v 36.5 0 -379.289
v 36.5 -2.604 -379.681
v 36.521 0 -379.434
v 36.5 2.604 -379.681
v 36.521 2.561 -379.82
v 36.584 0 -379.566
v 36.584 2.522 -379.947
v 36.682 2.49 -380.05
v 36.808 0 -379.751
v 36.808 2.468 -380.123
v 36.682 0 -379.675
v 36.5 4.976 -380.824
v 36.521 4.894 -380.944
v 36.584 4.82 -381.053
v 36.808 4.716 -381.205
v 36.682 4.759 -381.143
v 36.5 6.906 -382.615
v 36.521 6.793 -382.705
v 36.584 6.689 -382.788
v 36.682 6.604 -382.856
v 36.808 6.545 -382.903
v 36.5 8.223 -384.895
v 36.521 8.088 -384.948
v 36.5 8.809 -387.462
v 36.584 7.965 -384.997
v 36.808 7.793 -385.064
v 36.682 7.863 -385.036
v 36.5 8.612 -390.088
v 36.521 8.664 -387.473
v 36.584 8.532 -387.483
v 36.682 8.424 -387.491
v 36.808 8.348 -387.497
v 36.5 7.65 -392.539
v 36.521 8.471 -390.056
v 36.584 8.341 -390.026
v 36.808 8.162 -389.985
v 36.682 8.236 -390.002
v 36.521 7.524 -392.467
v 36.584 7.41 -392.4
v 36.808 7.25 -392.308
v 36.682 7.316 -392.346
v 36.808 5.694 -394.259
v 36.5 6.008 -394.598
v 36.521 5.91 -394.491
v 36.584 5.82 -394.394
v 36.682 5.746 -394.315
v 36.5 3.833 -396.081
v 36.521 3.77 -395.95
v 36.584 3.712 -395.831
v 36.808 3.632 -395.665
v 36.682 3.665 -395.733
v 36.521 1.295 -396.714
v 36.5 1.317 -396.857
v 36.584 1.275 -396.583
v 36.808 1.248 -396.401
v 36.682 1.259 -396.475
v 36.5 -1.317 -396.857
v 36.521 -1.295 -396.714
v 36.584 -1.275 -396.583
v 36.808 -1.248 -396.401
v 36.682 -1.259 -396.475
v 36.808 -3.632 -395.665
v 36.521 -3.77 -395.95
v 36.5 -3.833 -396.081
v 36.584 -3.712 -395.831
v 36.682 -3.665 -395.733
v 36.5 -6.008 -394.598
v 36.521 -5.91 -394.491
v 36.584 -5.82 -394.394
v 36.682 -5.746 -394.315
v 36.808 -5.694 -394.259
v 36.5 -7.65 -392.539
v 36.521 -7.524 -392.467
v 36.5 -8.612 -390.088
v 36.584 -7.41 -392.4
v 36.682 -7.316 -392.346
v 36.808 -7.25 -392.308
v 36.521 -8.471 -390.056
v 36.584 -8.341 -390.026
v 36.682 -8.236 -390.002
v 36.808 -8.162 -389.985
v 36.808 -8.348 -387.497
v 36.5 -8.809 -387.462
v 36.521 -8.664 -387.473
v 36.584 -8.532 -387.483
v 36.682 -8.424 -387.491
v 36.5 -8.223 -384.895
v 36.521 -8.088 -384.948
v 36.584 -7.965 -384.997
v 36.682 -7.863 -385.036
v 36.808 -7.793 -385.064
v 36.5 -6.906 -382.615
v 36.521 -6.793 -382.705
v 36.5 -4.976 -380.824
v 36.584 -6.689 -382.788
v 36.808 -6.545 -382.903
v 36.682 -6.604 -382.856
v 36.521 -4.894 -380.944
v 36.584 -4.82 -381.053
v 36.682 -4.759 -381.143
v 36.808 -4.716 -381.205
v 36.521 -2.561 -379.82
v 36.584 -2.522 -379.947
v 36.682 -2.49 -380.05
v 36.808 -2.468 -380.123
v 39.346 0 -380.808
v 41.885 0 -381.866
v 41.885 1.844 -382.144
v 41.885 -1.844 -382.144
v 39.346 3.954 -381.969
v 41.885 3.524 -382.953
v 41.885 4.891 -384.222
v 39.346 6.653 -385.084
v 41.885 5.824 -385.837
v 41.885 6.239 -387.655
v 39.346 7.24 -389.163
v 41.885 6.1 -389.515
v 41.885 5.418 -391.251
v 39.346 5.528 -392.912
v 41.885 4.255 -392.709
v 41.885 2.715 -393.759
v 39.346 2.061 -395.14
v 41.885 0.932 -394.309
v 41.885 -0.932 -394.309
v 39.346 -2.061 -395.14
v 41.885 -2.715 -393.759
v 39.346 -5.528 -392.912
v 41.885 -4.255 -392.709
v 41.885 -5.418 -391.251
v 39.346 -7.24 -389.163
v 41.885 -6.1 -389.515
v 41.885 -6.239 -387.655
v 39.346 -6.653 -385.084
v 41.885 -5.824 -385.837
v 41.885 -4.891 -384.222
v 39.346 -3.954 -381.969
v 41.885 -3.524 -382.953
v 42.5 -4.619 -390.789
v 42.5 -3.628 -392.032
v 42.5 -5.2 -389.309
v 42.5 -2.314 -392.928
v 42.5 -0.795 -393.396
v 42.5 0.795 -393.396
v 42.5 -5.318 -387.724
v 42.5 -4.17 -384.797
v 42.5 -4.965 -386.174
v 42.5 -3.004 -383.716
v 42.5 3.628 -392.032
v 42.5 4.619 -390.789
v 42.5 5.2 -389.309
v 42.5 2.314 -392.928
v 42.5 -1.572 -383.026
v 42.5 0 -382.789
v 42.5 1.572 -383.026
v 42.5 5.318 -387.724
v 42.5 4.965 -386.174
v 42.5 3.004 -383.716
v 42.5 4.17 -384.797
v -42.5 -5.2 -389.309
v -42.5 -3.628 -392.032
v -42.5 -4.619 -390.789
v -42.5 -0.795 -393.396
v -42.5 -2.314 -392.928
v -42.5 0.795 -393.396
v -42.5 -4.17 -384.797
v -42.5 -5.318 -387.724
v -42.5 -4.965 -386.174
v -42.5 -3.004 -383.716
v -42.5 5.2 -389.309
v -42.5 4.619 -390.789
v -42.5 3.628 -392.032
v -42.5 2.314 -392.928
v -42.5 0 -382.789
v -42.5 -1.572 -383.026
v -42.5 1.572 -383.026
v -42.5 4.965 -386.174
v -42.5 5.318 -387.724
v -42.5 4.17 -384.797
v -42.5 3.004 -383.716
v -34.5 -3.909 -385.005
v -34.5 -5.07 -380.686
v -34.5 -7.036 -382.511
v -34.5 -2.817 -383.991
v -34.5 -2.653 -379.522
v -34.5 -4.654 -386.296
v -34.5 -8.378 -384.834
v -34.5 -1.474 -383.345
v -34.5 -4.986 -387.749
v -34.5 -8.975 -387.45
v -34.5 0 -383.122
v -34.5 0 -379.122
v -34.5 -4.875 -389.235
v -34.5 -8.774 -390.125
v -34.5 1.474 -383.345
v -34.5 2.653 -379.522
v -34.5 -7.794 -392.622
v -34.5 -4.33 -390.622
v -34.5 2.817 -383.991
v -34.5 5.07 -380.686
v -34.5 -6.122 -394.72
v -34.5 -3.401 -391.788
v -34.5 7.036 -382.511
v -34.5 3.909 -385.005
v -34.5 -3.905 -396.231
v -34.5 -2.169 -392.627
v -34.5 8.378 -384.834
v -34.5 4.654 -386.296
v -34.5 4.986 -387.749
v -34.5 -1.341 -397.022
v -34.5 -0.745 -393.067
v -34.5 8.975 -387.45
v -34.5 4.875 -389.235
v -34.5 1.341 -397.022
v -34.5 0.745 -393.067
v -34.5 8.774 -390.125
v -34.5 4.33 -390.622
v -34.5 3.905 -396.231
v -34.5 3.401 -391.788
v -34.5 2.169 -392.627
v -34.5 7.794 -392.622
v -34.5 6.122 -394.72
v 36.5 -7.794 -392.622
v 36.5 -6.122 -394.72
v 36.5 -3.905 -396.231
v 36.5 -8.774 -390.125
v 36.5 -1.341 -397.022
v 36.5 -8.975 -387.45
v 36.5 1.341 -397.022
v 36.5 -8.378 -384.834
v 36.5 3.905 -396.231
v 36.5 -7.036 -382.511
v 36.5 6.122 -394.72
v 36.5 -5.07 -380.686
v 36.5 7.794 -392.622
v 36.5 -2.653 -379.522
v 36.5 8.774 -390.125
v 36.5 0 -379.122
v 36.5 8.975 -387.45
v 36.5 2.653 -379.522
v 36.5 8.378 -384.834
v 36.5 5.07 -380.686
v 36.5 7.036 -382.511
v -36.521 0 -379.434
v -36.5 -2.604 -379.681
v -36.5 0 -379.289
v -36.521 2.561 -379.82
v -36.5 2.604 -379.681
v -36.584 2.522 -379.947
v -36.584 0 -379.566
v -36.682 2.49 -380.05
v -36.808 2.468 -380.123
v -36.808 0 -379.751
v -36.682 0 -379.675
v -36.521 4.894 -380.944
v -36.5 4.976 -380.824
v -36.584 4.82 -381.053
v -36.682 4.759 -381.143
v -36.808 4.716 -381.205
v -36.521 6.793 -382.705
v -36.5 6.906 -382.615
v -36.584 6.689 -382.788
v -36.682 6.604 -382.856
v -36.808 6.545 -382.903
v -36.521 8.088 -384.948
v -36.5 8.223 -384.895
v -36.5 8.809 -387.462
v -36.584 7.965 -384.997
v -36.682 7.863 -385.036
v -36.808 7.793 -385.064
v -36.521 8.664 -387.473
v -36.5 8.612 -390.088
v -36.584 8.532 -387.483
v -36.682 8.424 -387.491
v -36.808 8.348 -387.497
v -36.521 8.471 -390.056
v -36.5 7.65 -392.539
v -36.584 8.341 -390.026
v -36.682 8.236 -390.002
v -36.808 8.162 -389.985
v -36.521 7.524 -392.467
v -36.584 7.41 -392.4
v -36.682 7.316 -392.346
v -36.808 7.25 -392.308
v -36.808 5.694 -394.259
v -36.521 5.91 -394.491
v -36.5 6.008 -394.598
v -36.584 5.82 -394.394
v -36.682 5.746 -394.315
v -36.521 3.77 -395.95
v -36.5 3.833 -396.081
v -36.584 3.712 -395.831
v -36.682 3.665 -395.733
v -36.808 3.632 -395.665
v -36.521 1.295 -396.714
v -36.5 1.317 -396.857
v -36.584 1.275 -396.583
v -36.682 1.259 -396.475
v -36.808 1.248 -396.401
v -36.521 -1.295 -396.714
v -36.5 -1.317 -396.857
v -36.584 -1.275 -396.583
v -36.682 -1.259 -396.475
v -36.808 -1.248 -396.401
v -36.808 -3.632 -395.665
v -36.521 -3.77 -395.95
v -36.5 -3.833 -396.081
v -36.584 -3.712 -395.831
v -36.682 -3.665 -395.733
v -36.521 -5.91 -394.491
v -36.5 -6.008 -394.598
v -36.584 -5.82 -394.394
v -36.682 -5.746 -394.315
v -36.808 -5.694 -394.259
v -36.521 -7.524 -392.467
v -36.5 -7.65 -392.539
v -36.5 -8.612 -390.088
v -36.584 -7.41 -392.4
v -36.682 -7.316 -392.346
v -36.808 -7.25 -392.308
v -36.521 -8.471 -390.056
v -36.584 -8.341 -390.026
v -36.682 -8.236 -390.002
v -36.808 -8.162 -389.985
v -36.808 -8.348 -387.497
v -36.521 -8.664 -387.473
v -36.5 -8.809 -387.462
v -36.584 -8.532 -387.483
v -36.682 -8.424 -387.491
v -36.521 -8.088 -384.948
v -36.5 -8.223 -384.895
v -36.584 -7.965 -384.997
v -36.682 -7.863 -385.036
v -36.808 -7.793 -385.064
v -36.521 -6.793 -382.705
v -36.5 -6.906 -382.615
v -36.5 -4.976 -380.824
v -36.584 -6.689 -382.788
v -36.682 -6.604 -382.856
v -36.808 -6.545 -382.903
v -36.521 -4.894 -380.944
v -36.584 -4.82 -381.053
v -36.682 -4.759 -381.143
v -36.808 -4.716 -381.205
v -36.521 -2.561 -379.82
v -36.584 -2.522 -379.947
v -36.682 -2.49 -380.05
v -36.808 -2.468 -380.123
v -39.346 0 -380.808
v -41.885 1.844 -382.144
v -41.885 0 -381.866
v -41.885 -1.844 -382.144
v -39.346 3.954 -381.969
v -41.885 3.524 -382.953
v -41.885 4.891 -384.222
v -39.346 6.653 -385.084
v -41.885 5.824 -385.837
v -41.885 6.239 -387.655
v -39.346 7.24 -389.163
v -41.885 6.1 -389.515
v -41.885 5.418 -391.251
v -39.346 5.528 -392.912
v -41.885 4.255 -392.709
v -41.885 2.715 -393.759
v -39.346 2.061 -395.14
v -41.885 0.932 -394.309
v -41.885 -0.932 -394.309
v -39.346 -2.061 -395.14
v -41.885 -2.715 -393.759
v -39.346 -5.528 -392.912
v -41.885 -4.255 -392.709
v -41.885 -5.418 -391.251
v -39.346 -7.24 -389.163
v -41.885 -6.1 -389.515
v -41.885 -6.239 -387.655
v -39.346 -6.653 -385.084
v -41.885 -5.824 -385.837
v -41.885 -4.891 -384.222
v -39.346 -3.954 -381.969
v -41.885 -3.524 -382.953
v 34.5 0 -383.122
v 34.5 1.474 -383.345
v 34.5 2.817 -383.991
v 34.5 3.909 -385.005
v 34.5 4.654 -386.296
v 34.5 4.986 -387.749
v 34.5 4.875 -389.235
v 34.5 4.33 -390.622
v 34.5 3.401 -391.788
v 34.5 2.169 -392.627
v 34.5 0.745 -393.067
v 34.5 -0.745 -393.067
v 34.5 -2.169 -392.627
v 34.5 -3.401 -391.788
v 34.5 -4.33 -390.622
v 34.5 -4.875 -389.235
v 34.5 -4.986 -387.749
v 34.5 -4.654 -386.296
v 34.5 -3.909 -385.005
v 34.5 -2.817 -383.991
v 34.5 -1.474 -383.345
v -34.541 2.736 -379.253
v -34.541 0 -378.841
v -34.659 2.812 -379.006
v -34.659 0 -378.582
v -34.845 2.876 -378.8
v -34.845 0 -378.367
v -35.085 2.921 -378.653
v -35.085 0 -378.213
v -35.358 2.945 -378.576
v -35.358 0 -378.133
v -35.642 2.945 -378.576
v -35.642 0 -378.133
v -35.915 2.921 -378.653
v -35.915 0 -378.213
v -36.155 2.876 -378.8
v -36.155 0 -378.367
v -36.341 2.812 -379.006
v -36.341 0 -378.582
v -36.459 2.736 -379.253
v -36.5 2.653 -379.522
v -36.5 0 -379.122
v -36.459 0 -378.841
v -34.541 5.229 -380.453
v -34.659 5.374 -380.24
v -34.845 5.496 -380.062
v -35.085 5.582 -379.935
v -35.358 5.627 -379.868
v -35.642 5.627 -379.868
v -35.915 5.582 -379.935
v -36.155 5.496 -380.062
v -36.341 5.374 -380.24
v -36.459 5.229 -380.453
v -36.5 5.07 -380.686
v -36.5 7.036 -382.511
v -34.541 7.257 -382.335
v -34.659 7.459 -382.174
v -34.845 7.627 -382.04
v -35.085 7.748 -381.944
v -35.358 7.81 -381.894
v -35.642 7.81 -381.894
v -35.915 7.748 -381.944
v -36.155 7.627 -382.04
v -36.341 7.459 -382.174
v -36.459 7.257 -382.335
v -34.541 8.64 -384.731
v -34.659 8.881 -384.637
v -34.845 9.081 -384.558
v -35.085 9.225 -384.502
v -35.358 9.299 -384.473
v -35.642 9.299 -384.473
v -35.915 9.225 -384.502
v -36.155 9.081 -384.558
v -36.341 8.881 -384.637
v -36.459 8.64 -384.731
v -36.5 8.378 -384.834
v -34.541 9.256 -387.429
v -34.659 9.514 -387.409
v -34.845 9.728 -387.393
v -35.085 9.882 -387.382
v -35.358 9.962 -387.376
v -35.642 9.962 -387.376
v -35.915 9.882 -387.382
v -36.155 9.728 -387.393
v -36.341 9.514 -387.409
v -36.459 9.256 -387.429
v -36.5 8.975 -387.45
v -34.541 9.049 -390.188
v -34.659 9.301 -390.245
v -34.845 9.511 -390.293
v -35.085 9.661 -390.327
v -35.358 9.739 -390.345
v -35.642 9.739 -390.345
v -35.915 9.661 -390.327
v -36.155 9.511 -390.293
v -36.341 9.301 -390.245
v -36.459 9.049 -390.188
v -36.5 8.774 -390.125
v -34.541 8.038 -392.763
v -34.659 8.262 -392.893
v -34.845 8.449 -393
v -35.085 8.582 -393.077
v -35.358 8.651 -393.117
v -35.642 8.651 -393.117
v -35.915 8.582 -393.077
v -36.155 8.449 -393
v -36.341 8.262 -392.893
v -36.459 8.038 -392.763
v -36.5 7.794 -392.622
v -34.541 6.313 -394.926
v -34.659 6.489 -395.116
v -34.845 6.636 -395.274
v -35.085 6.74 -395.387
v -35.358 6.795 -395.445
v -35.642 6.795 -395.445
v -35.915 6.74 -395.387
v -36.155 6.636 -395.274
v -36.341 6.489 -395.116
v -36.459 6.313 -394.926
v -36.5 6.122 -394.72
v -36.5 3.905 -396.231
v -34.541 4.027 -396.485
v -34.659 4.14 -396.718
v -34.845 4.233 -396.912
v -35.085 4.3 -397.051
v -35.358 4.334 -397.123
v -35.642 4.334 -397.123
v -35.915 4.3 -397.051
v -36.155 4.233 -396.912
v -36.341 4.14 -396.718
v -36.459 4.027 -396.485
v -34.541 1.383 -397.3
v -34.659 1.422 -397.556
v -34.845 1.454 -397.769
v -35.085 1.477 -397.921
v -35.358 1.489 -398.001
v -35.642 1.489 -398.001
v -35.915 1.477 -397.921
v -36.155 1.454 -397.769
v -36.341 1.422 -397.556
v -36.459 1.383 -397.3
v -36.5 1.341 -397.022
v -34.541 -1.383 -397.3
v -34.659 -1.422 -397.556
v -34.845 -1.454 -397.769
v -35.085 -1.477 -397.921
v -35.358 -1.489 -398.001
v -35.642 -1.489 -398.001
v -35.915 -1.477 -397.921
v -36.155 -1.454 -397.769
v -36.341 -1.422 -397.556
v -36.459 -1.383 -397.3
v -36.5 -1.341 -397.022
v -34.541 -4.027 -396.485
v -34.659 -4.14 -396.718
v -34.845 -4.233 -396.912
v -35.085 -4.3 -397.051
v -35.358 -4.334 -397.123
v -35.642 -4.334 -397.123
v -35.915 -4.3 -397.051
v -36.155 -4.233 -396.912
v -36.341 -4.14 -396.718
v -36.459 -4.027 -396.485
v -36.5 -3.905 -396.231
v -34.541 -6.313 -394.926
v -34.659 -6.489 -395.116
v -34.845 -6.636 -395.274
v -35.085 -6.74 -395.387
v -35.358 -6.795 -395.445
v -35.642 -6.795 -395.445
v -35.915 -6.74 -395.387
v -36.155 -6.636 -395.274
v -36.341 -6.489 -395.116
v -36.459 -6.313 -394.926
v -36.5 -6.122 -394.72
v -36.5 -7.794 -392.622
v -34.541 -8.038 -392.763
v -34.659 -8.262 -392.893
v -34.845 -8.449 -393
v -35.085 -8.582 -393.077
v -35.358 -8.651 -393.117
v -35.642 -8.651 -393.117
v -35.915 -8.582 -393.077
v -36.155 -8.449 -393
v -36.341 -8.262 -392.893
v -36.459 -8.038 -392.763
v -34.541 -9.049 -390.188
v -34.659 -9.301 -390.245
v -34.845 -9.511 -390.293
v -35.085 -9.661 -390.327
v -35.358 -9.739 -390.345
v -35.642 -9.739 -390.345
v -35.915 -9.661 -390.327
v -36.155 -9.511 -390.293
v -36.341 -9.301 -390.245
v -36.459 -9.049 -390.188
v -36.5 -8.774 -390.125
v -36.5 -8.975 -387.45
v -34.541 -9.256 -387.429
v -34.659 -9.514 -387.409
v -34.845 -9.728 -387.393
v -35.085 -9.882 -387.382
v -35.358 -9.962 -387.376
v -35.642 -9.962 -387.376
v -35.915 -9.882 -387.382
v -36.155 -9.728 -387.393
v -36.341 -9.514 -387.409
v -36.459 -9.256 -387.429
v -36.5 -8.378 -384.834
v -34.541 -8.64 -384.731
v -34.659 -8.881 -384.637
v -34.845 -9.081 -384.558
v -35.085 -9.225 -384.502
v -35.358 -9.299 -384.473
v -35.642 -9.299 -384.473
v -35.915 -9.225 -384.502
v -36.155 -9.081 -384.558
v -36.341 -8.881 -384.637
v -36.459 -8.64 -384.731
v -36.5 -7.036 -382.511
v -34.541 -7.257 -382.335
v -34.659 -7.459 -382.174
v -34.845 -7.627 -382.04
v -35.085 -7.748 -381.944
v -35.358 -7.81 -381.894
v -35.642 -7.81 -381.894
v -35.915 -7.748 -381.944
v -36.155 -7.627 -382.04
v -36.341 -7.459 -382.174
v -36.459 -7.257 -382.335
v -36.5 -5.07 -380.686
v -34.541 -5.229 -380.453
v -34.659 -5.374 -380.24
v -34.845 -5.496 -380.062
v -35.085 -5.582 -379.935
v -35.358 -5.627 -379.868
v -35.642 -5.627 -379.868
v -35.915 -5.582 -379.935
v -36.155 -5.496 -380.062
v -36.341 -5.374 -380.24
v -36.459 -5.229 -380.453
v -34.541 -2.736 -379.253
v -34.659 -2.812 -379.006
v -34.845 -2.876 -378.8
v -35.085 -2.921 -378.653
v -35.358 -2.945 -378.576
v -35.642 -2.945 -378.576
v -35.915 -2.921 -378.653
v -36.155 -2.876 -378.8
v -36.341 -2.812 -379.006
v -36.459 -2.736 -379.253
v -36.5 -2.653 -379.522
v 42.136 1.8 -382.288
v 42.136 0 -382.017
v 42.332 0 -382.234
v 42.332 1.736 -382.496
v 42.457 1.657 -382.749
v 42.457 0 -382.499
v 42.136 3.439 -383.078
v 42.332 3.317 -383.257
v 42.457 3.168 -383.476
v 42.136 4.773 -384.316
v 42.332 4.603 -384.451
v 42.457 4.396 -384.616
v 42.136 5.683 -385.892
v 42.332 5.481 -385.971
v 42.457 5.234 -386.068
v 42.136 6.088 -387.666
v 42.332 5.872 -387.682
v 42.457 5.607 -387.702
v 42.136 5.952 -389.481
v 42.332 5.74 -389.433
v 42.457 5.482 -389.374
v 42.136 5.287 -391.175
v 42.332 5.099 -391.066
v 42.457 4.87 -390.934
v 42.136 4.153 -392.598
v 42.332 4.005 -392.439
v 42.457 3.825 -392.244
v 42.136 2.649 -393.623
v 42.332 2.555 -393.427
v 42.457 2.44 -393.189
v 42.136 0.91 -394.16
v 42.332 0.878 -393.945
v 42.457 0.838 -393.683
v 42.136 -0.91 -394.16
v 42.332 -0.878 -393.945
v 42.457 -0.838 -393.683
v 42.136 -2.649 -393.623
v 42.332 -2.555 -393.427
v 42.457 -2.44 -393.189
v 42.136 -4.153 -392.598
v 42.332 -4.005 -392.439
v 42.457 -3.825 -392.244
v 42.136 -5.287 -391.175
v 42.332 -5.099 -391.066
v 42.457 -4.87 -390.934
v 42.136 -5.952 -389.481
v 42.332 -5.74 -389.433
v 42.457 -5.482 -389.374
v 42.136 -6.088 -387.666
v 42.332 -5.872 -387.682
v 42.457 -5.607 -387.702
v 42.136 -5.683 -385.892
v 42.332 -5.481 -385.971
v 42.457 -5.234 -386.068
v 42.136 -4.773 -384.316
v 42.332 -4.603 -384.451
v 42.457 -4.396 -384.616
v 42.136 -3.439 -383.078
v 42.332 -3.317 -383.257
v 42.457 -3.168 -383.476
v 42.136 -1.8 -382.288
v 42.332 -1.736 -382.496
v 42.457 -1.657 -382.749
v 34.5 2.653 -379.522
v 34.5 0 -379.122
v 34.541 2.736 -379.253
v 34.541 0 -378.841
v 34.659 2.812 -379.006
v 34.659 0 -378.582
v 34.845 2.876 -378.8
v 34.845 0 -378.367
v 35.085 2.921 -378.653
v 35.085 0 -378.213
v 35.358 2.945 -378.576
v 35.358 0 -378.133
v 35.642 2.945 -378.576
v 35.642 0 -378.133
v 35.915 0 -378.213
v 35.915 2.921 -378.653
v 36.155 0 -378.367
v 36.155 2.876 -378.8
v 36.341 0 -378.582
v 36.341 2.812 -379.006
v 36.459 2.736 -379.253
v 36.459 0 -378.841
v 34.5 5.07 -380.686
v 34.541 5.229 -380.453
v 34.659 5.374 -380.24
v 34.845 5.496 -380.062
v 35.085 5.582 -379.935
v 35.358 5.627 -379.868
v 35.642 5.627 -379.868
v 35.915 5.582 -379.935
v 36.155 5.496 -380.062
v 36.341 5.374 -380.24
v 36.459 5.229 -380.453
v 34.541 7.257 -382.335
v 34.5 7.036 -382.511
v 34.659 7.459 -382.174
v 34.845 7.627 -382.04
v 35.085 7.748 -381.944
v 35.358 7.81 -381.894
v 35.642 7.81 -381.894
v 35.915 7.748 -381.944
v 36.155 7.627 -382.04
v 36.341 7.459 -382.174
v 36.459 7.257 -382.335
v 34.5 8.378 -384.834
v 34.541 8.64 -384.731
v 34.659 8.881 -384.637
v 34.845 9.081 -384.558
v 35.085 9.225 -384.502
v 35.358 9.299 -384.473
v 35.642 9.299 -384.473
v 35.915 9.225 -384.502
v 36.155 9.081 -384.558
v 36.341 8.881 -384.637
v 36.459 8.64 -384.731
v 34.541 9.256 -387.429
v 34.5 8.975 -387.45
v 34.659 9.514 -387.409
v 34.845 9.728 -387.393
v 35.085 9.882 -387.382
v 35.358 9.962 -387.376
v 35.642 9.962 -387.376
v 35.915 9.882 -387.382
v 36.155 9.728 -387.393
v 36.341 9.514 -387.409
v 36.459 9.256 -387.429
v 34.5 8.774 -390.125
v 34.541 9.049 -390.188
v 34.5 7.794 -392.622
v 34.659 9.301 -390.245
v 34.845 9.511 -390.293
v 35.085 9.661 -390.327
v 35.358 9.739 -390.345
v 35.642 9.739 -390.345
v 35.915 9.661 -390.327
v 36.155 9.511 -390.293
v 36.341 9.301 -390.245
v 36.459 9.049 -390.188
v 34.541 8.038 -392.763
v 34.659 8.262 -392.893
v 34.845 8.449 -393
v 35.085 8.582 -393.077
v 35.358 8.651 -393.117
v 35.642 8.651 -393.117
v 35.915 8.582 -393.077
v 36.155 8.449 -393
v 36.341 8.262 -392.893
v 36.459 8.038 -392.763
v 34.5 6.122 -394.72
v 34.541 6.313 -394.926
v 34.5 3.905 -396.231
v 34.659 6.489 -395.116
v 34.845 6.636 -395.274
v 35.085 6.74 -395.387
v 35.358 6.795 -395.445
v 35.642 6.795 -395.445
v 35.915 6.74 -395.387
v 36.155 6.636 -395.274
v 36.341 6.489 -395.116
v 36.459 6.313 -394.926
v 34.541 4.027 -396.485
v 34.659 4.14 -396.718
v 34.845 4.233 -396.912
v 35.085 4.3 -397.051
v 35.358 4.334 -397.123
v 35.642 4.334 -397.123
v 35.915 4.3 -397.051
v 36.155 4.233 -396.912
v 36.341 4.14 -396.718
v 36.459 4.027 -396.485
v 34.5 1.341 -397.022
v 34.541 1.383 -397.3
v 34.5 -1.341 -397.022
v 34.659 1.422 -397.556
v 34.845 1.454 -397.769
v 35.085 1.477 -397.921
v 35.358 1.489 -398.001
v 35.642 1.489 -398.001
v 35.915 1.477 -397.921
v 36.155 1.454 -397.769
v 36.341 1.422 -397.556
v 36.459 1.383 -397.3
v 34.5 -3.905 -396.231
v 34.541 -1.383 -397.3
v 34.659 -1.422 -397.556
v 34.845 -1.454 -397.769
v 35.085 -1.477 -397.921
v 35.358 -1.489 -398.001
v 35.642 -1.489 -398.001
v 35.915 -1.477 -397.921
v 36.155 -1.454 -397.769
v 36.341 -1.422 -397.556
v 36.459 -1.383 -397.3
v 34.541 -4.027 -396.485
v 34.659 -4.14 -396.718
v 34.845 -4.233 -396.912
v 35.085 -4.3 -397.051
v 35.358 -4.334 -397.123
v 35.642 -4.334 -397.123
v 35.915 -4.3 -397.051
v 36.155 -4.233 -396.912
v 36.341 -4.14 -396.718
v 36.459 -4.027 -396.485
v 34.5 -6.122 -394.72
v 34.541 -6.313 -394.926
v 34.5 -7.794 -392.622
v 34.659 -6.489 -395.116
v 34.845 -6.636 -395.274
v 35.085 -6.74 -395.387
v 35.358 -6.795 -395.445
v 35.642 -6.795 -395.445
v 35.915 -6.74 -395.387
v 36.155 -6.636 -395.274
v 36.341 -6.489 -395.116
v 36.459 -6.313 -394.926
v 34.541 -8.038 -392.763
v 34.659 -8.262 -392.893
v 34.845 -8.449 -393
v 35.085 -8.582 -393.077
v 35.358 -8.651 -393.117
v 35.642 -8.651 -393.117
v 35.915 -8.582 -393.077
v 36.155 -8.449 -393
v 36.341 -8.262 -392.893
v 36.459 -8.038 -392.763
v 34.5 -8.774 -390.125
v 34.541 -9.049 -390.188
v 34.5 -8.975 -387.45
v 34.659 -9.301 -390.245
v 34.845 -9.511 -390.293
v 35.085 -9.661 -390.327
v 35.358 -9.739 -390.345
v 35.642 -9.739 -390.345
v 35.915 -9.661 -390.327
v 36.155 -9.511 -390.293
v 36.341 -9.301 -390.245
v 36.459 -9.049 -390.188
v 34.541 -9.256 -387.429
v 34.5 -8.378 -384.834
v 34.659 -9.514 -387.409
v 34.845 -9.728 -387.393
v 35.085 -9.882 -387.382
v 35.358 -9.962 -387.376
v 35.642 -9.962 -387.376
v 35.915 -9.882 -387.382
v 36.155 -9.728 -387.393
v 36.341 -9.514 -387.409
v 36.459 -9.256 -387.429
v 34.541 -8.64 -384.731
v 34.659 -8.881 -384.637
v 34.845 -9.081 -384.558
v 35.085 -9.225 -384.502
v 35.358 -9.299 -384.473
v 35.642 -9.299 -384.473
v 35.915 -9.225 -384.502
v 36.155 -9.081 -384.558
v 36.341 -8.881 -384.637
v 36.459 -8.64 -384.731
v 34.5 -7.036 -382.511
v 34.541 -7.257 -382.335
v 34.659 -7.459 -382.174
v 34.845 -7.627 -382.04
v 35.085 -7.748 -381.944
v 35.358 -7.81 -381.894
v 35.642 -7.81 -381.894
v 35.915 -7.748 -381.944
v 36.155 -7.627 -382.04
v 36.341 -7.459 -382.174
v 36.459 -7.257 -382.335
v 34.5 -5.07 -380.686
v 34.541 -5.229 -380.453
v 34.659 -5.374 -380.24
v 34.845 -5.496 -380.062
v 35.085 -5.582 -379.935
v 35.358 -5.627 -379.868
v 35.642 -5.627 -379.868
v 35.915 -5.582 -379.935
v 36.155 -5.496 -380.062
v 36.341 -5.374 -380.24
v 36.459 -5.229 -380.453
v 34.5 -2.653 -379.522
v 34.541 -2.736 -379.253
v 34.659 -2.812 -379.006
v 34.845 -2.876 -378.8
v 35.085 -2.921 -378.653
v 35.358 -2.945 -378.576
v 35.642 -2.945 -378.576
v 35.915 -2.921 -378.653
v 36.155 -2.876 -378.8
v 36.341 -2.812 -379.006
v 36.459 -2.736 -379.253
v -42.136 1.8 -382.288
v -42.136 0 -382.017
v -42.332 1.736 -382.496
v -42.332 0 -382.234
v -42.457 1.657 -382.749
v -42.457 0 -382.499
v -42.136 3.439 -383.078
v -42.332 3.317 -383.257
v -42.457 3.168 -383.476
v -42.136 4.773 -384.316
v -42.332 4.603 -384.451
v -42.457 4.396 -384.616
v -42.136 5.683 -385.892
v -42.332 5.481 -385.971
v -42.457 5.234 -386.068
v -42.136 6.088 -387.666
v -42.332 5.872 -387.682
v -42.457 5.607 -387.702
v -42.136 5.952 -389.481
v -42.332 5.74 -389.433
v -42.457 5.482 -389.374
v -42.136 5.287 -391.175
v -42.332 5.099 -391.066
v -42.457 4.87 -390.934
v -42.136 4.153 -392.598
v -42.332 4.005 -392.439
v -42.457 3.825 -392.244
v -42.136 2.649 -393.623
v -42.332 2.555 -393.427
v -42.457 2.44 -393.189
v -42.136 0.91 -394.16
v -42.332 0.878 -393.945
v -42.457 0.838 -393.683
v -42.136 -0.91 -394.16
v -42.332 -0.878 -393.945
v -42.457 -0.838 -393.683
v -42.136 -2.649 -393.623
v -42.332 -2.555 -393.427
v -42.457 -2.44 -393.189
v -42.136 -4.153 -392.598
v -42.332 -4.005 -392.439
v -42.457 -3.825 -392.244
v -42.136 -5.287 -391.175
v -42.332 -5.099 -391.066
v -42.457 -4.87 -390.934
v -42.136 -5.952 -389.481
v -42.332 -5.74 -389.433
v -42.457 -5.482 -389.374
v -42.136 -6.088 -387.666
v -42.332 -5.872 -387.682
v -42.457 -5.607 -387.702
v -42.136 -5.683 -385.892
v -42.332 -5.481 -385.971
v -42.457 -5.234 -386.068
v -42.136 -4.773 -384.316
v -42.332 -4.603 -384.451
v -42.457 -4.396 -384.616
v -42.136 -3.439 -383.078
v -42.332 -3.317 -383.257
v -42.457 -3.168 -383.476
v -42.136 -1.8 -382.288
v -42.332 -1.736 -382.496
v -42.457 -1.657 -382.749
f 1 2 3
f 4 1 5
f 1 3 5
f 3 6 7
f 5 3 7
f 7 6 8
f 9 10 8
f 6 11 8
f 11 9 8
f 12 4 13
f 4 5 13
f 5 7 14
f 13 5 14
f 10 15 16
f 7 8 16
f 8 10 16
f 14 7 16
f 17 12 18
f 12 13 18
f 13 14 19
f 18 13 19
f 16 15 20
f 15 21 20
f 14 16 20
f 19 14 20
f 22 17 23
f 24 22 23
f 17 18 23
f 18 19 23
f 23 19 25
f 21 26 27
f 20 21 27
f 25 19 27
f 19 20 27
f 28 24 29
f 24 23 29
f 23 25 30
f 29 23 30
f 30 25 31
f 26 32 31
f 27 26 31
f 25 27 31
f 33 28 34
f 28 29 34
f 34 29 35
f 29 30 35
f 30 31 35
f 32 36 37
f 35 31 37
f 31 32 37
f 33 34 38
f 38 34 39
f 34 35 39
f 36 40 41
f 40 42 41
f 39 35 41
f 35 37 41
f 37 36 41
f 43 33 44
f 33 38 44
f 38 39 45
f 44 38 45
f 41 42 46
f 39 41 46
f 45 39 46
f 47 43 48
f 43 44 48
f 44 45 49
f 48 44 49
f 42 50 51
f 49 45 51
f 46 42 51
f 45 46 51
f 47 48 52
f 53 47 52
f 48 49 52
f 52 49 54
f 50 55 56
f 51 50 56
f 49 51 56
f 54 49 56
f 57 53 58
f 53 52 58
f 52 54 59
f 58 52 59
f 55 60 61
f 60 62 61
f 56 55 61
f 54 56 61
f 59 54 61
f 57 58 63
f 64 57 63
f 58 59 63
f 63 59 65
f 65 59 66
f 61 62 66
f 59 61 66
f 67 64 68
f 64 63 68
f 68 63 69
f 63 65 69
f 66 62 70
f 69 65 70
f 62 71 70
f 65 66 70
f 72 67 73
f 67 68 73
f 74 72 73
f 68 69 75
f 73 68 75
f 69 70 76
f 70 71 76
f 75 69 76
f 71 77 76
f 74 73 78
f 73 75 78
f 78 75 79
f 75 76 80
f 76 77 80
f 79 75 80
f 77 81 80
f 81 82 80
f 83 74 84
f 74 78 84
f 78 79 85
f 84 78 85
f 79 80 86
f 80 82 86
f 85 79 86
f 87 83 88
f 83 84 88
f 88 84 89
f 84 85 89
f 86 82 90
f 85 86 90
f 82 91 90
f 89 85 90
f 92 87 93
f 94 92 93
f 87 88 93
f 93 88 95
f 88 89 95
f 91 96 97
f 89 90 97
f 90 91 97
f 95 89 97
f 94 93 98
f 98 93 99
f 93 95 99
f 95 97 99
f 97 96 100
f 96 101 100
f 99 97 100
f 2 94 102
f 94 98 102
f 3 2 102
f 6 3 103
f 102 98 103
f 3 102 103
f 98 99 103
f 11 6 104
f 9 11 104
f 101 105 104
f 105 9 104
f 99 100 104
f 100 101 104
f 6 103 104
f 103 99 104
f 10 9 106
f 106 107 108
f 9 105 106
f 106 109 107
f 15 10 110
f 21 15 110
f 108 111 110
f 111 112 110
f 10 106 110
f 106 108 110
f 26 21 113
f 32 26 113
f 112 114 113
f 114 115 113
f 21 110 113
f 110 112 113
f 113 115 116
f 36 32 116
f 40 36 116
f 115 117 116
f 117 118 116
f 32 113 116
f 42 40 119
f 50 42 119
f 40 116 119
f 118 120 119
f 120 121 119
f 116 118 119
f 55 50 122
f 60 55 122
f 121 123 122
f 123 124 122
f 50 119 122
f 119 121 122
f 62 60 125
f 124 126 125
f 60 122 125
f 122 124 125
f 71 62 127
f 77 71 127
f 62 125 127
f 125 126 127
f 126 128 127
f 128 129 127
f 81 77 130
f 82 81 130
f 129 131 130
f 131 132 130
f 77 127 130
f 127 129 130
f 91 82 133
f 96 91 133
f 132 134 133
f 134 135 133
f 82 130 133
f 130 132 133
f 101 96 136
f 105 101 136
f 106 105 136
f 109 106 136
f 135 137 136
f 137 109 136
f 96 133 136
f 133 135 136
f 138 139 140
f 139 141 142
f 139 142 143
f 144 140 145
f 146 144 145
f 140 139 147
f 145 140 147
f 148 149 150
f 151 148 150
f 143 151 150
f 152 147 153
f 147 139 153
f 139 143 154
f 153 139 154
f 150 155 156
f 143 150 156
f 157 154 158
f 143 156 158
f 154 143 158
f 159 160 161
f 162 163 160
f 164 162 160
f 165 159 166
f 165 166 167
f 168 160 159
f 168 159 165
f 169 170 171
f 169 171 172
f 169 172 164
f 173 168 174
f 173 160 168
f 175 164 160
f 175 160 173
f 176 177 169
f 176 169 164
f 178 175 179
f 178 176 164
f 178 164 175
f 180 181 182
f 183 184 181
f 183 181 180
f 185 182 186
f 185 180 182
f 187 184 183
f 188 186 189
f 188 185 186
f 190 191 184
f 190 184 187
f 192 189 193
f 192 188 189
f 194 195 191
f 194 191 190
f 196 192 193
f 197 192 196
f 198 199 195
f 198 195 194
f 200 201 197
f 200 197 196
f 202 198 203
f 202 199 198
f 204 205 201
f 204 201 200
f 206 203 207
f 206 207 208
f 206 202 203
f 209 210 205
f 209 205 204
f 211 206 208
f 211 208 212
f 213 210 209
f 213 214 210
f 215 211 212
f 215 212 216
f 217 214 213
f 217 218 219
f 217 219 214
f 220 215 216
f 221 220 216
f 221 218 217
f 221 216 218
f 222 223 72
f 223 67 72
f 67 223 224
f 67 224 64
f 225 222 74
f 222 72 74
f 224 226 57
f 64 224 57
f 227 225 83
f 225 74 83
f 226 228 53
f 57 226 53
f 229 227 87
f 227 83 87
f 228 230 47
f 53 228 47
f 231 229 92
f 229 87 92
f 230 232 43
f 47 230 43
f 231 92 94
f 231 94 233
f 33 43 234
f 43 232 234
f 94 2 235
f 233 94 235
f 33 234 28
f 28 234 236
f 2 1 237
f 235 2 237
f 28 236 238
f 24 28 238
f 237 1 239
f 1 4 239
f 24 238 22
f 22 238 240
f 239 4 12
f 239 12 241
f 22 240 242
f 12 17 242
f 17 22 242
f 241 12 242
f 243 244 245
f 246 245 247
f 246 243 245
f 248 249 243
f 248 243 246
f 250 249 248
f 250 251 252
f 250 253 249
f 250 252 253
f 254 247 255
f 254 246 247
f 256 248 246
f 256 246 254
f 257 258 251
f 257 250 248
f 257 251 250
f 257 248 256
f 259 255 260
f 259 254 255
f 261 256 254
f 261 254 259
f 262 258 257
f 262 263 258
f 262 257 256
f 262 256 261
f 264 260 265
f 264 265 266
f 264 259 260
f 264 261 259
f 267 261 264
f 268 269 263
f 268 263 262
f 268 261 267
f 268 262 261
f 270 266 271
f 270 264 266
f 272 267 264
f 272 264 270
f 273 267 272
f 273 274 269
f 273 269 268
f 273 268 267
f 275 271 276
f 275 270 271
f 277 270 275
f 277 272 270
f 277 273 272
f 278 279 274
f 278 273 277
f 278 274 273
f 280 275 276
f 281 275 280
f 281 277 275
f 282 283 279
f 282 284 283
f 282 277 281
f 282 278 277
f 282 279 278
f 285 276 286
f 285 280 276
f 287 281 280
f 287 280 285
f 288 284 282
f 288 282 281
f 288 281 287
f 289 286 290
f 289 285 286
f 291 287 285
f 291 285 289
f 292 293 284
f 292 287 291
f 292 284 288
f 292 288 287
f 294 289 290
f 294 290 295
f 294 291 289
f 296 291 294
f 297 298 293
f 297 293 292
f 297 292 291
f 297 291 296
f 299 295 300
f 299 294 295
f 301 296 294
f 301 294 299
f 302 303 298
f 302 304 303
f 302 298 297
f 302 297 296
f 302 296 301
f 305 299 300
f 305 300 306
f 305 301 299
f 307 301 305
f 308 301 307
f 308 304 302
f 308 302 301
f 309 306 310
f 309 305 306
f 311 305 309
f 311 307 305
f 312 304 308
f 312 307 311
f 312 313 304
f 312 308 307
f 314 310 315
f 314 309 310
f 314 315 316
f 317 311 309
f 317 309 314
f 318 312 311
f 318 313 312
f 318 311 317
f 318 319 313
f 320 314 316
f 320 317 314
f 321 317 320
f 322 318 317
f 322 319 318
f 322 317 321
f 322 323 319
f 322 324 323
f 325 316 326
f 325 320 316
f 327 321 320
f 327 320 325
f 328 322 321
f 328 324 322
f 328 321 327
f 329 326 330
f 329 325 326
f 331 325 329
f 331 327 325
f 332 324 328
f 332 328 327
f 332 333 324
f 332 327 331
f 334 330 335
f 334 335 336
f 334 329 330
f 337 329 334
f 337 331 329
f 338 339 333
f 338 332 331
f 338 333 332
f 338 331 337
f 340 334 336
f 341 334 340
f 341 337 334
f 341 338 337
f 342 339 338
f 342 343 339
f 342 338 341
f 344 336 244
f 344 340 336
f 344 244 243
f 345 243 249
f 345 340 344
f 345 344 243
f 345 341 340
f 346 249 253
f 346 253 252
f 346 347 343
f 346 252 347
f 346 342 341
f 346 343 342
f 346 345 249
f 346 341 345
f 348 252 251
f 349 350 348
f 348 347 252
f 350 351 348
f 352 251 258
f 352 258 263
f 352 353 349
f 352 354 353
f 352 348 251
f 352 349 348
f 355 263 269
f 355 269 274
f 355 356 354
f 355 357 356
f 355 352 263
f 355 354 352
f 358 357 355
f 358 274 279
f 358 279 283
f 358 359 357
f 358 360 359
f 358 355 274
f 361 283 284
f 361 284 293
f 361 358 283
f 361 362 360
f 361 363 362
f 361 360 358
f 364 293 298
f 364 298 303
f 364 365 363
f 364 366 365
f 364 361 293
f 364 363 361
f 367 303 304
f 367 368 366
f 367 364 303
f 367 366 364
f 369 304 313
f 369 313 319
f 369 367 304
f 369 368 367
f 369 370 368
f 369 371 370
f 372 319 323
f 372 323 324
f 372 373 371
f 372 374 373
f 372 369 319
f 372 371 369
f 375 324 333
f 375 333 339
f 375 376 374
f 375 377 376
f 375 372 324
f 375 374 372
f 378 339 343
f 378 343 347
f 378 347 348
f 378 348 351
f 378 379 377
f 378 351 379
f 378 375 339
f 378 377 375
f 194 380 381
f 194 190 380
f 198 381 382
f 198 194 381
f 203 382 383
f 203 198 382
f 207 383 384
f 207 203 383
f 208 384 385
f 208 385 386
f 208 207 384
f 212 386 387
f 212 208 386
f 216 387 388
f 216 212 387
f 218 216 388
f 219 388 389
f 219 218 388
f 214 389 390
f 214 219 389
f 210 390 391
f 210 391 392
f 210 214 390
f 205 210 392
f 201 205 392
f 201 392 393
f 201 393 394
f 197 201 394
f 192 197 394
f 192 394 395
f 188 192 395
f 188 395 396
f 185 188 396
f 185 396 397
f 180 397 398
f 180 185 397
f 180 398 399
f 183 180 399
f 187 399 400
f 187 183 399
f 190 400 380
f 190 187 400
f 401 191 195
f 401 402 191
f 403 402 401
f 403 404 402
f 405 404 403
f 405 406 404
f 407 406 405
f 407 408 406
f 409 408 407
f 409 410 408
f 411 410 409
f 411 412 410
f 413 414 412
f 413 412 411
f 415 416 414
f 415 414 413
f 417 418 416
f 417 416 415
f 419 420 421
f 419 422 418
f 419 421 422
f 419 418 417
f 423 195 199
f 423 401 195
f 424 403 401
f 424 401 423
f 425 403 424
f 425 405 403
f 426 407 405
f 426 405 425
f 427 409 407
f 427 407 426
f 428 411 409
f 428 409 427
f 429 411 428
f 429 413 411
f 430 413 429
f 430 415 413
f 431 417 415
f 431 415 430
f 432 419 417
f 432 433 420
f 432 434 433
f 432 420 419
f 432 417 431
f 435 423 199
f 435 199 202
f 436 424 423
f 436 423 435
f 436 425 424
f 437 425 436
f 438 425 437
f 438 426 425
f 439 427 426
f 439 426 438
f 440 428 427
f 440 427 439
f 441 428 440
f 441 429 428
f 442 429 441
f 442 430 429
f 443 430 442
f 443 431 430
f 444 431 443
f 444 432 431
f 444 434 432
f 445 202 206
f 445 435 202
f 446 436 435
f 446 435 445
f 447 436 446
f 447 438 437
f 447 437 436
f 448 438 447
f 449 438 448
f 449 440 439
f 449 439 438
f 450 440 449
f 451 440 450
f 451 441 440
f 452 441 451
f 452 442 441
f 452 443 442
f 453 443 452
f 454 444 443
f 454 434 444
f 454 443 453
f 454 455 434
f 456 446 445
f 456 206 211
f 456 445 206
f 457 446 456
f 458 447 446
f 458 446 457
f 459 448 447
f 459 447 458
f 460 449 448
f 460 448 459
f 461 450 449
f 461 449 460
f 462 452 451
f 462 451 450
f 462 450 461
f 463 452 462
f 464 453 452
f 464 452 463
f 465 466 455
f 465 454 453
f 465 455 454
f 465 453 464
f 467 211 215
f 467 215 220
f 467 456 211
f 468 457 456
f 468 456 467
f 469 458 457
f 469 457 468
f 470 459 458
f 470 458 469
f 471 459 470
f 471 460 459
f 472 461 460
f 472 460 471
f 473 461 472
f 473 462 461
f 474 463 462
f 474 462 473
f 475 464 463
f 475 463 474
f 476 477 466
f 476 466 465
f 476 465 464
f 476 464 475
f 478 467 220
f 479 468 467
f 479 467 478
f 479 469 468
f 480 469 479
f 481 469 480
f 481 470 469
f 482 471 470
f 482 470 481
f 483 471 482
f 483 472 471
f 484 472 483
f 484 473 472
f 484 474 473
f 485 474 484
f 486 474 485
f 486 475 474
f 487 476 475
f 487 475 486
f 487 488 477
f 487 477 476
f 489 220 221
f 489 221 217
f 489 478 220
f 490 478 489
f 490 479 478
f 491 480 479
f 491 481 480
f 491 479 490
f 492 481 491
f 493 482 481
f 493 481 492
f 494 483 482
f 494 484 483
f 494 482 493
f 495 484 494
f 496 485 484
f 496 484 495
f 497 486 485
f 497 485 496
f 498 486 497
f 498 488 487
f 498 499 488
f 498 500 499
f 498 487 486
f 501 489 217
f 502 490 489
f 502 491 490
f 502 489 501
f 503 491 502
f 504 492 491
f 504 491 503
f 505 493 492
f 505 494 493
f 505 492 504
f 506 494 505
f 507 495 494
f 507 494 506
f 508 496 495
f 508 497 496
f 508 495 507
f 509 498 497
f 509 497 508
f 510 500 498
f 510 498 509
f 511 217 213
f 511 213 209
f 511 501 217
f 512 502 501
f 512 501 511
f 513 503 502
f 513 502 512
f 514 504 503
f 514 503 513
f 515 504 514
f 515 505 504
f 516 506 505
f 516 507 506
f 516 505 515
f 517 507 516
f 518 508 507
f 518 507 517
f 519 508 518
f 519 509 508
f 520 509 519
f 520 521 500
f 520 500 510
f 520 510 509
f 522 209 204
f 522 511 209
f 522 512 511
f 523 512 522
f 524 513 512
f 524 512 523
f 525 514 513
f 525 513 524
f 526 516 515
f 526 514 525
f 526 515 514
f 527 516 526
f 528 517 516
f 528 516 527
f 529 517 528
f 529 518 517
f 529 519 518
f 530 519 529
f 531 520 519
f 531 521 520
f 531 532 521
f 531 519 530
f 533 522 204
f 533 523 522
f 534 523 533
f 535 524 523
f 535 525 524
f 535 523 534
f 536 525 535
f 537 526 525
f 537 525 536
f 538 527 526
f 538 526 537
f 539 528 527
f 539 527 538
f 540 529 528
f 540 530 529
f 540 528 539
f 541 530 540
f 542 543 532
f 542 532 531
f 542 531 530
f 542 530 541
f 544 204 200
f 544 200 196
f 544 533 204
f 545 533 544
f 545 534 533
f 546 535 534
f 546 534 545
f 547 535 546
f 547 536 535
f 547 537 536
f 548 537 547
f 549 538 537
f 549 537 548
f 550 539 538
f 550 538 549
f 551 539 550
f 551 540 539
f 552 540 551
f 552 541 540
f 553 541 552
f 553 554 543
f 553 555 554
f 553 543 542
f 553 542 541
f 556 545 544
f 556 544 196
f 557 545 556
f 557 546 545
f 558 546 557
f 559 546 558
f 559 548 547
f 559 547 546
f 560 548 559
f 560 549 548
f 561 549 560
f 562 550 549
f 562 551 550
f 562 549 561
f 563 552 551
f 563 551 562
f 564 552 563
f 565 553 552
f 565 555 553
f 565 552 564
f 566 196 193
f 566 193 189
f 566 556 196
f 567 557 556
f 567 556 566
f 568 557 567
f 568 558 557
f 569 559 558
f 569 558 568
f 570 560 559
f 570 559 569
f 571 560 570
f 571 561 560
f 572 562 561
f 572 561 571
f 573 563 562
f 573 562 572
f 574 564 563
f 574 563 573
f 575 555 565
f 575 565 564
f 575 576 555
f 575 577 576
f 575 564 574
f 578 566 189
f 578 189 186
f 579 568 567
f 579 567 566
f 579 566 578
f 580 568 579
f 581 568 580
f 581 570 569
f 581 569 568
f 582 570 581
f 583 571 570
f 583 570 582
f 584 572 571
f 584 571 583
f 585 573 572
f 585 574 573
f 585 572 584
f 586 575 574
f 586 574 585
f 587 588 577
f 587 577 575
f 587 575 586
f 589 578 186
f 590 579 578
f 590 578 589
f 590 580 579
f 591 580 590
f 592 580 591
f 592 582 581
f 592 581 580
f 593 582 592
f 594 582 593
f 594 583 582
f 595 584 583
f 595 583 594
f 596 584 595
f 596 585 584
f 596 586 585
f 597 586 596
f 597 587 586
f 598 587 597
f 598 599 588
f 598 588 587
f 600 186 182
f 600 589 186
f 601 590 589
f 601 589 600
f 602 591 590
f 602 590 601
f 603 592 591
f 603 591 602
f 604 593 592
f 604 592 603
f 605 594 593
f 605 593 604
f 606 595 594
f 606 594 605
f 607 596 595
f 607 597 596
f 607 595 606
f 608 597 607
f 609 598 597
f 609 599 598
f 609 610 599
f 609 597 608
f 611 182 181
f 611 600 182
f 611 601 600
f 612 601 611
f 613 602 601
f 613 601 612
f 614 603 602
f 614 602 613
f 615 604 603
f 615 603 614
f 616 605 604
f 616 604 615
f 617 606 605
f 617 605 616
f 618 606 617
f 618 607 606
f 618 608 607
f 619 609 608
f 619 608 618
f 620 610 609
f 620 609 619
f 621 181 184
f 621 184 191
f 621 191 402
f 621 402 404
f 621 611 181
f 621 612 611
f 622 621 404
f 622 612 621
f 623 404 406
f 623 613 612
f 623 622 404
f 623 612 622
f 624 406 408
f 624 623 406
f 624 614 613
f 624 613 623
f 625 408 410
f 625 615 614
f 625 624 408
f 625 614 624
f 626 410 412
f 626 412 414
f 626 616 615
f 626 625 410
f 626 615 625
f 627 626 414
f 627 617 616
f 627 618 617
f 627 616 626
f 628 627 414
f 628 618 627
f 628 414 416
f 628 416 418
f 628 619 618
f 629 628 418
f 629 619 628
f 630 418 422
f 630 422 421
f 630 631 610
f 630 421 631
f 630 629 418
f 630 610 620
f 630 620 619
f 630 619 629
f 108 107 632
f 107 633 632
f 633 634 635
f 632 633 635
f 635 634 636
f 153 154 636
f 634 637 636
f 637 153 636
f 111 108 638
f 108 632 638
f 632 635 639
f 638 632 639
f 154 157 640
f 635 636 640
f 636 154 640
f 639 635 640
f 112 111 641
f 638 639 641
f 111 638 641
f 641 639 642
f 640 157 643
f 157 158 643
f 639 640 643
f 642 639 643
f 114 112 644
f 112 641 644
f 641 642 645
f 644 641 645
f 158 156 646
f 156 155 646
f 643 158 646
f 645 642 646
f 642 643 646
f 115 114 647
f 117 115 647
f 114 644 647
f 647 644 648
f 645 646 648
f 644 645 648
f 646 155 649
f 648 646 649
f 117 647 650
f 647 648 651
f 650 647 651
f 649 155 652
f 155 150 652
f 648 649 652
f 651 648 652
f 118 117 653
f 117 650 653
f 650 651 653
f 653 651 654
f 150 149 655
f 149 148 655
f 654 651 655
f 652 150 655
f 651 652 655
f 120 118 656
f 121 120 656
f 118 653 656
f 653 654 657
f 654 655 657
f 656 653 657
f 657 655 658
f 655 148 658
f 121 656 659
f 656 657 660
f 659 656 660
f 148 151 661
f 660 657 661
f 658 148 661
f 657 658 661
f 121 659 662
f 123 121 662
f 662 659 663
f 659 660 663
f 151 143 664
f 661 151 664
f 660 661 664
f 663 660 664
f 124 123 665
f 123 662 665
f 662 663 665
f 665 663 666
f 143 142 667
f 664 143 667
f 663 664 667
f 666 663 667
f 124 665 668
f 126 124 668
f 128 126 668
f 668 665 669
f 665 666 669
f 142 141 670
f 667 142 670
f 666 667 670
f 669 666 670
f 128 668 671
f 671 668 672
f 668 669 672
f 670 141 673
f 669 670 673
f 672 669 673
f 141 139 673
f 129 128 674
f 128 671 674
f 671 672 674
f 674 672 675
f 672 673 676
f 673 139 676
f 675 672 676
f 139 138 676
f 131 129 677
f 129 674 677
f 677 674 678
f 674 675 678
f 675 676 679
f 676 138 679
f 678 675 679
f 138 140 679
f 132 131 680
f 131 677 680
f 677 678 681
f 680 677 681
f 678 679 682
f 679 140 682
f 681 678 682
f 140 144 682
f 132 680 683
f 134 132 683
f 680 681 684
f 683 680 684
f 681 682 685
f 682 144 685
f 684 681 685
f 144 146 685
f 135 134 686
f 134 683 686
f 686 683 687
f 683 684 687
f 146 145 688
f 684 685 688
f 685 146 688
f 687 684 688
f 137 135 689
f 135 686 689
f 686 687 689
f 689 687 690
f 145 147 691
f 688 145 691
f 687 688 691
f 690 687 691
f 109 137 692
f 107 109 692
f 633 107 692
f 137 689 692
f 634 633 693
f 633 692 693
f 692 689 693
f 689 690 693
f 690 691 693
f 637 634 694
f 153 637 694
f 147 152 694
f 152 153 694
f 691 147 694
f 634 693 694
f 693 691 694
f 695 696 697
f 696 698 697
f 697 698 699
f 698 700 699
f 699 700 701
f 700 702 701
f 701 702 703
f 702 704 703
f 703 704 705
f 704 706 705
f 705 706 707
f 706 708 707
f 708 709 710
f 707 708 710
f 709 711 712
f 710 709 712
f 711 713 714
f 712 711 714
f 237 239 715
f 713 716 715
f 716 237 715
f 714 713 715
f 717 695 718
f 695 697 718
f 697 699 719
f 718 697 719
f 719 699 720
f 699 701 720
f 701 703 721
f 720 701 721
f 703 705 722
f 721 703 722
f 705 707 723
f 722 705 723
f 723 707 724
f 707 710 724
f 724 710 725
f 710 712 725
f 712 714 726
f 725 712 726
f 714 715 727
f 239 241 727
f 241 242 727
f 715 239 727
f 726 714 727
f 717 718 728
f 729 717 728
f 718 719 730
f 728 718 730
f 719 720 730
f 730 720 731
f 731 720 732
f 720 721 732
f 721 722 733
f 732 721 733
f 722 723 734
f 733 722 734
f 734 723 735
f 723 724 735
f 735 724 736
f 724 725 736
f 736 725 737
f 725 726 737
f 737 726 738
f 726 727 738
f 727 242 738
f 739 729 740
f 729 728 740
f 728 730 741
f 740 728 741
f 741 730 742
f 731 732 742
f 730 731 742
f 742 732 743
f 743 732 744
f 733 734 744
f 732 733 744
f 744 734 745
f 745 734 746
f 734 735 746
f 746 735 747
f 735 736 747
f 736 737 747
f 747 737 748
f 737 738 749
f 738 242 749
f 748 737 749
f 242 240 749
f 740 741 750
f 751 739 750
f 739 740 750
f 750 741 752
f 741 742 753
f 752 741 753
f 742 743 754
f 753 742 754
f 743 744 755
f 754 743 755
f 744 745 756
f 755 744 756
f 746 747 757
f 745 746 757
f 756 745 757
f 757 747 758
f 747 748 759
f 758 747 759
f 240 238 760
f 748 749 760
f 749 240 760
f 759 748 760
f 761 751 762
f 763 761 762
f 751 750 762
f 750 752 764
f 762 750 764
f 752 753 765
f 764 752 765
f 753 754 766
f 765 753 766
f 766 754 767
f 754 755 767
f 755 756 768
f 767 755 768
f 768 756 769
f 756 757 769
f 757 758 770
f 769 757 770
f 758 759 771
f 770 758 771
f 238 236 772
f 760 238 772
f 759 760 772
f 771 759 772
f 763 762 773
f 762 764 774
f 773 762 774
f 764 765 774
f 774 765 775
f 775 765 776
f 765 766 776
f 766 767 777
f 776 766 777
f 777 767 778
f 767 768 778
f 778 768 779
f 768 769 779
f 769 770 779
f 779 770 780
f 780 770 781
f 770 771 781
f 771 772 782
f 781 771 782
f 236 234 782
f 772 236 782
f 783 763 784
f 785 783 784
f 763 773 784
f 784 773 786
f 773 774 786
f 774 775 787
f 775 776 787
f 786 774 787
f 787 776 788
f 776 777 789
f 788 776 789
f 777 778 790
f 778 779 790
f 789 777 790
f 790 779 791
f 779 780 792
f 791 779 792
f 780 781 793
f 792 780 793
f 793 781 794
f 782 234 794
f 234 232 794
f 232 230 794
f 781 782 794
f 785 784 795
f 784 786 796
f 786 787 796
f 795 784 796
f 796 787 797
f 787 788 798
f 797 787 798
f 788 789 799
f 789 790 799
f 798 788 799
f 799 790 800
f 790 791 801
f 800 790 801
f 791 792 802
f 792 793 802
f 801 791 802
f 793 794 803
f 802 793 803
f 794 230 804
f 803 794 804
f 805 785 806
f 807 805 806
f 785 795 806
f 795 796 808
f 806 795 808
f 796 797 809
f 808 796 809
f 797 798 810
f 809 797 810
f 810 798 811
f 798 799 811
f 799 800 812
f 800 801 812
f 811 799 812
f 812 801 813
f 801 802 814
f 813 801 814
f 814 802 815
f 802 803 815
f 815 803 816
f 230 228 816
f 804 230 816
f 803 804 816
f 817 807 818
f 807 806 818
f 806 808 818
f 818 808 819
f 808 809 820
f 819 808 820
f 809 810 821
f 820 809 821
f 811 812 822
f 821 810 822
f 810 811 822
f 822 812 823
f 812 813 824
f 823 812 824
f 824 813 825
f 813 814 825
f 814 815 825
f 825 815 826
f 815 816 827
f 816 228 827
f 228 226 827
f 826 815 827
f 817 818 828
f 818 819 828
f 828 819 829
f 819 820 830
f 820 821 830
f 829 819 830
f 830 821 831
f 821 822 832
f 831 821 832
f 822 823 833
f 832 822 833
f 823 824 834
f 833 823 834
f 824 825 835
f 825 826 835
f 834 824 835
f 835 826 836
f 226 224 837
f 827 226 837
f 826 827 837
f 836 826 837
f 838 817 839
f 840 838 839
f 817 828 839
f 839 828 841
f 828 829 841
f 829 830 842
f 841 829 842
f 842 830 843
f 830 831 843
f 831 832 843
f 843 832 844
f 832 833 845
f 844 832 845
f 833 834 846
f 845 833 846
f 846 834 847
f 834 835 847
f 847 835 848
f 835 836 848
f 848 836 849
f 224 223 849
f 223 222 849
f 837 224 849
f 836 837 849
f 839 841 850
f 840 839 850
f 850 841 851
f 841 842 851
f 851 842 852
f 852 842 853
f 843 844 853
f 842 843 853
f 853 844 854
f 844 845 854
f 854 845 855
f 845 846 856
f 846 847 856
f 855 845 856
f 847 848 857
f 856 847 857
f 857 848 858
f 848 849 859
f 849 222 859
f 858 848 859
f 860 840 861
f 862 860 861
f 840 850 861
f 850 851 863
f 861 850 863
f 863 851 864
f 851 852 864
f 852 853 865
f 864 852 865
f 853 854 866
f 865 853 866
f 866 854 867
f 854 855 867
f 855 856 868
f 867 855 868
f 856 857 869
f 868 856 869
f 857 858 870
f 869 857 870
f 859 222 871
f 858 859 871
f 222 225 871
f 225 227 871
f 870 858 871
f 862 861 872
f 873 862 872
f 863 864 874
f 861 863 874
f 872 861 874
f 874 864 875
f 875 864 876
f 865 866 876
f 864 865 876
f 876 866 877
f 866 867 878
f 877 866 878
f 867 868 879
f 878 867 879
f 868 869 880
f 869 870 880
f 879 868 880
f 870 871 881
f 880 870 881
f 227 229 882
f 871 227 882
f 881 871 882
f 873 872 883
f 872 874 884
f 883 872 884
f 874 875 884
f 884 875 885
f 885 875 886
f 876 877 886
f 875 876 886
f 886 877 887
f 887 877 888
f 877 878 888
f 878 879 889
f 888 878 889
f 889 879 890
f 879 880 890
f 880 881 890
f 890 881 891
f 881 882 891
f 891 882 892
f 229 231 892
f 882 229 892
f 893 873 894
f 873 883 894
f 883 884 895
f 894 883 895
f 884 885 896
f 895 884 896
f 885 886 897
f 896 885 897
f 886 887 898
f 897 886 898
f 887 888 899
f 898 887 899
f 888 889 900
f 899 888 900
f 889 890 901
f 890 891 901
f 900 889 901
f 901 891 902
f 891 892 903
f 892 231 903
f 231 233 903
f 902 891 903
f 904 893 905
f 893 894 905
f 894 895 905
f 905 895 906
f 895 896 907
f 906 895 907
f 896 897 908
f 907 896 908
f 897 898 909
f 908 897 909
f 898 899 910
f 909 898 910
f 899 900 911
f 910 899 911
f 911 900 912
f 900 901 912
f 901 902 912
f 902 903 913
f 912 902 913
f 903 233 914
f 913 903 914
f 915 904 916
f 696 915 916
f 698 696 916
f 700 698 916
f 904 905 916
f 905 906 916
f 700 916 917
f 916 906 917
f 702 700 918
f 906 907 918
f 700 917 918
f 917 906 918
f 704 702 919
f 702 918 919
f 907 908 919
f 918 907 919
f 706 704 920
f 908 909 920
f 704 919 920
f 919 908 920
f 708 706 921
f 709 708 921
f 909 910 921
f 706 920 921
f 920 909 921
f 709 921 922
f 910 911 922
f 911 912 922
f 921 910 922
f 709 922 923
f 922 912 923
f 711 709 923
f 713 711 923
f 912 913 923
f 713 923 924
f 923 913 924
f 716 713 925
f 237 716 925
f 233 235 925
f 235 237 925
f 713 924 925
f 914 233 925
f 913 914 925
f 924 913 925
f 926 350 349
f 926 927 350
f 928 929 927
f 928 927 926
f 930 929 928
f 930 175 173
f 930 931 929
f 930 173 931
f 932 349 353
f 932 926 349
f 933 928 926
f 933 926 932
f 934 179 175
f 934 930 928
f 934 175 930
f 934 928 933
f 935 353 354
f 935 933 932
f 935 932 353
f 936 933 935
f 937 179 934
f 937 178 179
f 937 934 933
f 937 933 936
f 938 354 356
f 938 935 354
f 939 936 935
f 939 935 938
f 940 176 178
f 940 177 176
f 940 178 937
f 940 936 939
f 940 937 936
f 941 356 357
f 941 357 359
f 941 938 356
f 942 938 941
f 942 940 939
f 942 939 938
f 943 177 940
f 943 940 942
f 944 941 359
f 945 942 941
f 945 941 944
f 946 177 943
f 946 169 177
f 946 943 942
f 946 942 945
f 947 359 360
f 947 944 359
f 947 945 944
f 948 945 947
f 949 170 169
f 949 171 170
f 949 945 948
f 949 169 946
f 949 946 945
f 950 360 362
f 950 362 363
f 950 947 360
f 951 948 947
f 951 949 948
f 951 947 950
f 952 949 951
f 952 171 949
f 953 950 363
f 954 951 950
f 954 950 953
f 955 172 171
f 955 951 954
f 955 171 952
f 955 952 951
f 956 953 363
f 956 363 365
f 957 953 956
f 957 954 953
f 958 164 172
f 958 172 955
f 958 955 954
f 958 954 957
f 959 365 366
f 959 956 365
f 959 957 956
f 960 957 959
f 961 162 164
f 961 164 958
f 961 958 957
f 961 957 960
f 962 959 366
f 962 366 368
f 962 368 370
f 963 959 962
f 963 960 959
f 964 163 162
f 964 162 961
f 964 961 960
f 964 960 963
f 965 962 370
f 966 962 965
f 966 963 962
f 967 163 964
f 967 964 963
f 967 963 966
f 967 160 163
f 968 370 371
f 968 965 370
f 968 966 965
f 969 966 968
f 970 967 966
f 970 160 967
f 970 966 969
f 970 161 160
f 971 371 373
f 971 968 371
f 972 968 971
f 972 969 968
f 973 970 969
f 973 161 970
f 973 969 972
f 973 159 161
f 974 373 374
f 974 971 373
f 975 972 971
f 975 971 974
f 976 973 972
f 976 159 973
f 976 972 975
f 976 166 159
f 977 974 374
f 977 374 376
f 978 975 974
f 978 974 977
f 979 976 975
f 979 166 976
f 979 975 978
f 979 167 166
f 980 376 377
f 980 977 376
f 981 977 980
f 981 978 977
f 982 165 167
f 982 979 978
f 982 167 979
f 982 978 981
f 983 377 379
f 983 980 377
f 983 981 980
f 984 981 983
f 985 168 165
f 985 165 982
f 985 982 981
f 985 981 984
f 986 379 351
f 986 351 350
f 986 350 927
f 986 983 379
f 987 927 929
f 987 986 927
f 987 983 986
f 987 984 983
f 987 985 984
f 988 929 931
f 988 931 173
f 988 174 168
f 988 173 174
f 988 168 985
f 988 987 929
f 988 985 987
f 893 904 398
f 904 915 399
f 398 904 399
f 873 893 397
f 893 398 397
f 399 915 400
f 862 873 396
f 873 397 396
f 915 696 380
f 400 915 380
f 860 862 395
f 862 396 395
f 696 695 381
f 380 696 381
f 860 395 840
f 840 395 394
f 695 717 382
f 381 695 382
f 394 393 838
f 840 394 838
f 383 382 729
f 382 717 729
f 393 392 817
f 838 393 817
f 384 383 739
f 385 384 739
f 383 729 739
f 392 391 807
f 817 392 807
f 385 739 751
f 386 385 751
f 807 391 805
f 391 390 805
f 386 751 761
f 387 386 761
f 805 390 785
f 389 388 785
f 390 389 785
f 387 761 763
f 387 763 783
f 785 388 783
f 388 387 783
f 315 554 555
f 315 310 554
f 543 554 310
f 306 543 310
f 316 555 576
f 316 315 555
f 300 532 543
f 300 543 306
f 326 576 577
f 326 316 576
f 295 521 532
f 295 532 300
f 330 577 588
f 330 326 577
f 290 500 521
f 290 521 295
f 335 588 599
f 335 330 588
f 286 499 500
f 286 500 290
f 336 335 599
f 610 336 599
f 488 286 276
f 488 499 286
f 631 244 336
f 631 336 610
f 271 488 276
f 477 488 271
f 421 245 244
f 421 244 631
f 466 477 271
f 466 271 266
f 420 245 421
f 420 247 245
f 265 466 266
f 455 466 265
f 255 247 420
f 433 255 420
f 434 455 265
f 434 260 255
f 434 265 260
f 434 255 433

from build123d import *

# Parameters (mm, degrees)
F0_W = 34.5
F0_H = 5


# Not quite as in the source:
# - ends of sketch curves that miss each other by under 0.0002 mm in the source are joined


with BuildPart() as f1:
    # F0 (on Front) → F1 (revolve)
    with BuildSketch(Plane.XZ):
        with BuildLine():
            Line((-34.5, -388.122387), (-34.5, -383.122387))
            Line((-34.5, -383.122387), (-34.5, -379.122387))
            ThreePointArc((-34.5, -379.122387), (-35.5, -378.122387), (-36.5, -379.122387))
            Line((-36.5, -379.122387), (-36.5, -379.289054))
            ThreePointArc((-36.5, -379.289054), (-36.5839747248, -379.5664039061), (-36.8076918817, -379.750592284))
            Line((-36.8076918817, -379.750592284), (-41.884615, -381.865977))
            ThreePointArc((-41.884615, -381.865977), (-42.3320501877, -382.2343536438), (-42.5, -382.789054))
            Line((-42.5, -382.789054), (-42.5, -388.122387))
            Line((-42.5, -388.122387), (-34.5, -388.122387))
        make_face()
        with Locations((-17.25, -385.622387)):
            Rectangle(F0_W, F0_H)
    revolve(axis=Axis((-21.25, 0, -388.122387), (-1, 0, 0)))

    # F2: F1 across face


with BuildPart() as f1_1:
    add(f1.part)
    add(f1.part.mirror(Plane(origin=(0, 0, -388.122387), x_dir=(0, 1, 0), z_dir=(1, 0, 0))))


solid = f1_1.part
